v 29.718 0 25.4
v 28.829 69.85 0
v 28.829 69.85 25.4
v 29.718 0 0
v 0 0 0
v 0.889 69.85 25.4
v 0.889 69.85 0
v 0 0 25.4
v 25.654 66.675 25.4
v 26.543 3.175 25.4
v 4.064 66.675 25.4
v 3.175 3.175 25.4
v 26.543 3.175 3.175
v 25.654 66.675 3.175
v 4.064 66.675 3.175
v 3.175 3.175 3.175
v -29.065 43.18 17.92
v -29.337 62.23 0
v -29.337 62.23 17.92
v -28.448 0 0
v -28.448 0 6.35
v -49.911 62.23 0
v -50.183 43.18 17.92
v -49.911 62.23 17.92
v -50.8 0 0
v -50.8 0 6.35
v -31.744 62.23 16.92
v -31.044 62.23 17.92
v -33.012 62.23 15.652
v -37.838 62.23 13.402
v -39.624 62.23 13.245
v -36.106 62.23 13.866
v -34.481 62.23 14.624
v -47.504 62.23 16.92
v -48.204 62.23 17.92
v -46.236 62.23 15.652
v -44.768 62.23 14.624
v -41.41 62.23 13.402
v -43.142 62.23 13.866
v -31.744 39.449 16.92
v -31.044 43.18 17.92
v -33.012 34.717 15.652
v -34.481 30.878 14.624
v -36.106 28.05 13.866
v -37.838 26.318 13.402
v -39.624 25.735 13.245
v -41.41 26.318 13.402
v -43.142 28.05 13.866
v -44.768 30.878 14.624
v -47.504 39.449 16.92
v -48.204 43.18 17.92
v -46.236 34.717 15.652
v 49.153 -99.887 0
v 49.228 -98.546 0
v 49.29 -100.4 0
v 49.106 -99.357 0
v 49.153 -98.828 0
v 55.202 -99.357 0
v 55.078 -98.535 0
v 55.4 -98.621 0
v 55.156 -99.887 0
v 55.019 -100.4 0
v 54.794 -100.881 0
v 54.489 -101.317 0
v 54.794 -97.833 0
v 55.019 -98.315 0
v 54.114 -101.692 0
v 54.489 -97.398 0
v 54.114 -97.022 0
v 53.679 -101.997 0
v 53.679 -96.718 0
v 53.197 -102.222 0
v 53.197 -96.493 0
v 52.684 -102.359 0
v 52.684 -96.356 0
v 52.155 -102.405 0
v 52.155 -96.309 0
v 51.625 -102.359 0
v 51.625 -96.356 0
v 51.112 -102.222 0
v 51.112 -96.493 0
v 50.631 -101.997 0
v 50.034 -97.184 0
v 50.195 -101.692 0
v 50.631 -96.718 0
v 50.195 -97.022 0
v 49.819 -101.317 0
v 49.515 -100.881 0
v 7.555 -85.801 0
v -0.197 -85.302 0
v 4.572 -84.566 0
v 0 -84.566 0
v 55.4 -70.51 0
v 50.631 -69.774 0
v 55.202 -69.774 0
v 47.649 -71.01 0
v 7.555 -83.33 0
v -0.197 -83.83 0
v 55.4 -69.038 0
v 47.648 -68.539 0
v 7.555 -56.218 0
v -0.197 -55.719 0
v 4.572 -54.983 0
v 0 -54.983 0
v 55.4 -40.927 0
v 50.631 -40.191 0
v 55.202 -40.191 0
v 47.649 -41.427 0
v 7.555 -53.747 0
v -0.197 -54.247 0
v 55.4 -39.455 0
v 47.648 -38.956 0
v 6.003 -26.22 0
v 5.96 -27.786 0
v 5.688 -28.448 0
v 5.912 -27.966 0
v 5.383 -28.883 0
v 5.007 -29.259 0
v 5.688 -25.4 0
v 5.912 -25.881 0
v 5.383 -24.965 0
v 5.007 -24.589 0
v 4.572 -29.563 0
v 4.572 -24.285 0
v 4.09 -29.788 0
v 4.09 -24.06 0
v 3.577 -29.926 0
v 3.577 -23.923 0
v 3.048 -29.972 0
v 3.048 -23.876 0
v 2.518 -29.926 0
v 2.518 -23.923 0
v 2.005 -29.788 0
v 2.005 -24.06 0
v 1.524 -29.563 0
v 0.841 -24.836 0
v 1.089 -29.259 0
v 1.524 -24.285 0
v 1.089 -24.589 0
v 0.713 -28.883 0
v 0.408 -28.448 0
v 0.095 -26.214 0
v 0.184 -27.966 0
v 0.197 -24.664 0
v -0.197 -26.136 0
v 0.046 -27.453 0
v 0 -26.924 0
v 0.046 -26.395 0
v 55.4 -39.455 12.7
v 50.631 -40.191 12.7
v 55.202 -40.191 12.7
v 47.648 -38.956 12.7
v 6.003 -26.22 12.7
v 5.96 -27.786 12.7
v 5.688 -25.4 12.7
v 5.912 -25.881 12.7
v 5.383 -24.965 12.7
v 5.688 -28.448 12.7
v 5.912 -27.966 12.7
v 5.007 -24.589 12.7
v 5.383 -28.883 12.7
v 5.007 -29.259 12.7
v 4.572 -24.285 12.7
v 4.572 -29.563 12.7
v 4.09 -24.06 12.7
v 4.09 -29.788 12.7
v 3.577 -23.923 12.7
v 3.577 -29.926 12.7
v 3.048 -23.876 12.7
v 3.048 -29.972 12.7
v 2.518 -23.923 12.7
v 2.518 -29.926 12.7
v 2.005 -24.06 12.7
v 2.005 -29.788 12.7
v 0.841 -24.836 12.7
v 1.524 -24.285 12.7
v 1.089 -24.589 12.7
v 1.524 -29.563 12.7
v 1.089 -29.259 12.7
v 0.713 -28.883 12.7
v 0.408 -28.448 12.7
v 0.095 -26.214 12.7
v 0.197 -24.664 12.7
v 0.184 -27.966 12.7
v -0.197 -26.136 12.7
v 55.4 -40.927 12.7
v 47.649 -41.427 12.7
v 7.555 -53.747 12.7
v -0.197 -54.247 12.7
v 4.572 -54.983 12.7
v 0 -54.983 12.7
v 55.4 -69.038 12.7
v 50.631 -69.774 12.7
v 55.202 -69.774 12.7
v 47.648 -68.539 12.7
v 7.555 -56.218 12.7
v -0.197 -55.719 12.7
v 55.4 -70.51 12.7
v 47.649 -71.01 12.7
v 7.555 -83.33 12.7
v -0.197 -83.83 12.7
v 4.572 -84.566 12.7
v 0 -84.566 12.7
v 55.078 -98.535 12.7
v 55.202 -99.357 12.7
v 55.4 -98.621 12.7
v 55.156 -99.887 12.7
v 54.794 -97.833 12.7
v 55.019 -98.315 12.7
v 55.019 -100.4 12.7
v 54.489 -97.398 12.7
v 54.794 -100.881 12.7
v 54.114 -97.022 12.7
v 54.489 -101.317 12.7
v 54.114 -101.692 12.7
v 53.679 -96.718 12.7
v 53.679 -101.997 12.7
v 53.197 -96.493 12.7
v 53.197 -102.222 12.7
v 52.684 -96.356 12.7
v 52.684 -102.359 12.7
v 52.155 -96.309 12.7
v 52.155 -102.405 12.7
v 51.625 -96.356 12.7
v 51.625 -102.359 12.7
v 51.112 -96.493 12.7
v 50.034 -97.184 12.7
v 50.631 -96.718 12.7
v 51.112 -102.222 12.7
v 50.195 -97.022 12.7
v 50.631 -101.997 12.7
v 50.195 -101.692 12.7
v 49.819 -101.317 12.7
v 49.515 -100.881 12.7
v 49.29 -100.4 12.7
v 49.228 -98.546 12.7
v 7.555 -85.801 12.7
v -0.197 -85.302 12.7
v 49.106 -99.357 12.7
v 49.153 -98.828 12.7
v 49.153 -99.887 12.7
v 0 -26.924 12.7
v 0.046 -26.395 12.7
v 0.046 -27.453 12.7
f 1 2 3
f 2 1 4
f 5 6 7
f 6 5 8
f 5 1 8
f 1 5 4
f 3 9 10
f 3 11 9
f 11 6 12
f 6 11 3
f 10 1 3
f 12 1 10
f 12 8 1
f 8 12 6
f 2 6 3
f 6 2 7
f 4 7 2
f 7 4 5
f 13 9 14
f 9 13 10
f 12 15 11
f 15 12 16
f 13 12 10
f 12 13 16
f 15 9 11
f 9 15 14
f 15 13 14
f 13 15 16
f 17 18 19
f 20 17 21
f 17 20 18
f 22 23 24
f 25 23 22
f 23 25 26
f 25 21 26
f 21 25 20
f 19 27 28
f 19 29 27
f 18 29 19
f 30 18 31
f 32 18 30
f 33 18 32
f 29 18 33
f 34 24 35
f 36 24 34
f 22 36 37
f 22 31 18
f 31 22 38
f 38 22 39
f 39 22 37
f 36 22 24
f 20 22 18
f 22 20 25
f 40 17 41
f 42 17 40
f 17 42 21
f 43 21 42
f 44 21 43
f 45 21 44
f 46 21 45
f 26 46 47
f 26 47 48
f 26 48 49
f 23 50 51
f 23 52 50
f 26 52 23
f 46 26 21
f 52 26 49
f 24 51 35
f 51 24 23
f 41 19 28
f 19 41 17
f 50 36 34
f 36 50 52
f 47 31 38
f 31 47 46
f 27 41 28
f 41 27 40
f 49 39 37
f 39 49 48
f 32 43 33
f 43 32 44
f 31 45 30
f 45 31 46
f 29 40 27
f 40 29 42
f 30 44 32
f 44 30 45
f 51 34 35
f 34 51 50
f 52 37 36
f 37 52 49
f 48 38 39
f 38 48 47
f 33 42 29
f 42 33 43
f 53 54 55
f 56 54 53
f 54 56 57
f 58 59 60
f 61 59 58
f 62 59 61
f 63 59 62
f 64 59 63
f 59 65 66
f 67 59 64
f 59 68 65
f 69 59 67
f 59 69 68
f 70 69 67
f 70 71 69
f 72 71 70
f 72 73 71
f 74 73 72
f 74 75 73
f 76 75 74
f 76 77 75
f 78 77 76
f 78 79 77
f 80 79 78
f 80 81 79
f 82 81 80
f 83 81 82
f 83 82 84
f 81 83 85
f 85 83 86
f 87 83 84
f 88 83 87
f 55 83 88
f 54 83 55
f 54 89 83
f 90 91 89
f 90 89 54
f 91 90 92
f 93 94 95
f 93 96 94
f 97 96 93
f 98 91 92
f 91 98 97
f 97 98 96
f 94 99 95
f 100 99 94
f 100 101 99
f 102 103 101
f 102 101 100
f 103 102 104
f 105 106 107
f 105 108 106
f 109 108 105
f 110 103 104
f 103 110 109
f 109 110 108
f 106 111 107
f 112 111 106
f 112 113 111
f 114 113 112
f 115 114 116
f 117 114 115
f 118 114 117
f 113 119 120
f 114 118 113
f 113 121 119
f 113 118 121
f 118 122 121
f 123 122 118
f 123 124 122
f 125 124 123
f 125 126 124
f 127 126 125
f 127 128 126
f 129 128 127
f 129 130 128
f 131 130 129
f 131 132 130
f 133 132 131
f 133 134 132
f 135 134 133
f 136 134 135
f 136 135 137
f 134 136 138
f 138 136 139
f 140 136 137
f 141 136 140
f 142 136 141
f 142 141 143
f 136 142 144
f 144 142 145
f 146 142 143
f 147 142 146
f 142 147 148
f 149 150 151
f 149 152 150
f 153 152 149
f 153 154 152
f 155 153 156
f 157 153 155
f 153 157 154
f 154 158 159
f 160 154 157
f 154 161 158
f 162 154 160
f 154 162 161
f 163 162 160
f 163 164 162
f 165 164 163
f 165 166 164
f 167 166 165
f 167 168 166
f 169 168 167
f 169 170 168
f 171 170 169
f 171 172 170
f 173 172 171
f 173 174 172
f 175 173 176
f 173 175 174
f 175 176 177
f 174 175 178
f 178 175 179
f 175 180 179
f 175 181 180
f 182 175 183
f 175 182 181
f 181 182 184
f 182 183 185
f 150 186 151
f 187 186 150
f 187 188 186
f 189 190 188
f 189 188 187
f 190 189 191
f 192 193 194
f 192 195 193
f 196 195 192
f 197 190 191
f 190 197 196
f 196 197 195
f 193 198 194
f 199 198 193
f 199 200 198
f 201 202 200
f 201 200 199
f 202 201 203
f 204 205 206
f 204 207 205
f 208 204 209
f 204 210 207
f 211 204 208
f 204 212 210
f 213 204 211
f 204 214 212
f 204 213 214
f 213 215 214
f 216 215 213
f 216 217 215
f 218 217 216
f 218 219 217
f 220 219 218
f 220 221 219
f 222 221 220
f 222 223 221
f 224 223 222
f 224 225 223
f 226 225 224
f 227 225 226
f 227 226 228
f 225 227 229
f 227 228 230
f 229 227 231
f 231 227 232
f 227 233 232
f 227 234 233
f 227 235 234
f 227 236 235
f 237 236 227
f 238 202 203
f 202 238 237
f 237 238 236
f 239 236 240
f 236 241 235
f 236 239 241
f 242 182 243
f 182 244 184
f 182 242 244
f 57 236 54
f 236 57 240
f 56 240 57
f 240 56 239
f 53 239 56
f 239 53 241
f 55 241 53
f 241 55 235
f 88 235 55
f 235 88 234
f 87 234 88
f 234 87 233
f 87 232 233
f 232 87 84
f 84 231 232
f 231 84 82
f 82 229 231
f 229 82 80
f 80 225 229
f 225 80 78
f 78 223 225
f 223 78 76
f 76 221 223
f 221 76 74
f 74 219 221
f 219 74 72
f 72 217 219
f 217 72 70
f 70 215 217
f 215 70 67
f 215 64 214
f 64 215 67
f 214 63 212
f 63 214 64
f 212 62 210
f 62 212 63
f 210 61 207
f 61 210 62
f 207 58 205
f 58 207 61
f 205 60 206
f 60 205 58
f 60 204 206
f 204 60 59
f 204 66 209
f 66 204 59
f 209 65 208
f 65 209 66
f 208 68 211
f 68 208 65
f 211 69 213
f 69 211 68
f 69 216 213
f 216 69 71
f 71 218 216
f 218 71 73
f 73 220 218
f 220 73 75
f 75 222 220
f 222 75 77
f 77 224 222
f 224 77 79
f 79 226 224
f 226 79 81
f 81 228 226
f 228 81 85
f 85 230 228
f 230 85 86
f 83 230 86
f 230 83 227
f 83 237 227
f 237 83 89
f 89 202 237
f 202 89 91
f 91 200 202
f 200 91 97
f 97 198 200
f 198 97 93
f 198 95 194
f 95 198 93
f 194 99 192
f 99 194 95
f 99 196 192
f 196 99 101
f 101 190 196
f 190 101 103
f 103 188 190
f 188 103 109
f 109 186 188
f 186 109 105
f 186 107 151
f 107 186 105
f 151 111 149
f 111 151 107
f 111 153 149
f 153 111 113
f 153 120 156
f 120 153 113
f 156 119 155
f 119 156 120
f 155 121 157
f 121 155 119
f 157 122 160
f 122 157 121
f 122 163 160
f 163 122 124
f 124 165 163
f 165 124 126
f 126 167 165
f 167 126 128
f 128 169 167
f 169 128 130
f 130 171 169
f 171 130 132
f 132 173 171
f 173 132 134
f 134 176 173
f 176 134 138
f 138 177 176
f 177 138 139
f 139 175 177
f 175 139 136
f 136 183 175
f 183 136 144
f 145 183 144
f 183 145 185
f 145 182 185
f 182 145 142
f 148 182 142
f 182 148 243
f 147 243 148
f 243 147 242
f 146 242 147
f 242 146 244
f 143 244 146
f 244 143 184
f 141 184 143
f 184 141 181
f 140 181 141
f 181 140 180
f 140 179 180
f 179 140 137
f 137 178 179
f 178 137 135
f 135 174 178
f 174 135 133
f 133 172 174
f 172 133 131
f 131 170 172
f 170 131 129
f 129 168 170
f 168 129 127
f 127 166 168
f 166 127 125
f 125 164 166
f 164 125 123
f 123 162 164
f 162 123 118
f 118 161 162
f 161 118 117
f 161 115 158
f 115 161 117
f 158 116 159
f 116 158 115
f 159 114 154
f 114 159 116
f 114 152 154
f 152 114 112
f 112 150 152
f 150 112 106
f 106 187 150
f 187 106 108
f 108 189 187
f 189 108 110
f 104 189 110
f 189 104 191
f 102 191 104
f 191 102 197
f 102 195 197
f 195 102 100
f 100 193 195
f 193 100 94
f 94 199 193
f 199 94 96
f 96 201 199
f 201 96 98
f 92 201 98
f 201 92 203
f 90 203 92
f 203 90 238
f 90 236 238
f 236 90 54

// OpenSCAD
// file: ../Components/Semicircle.scad
module semicircle(od=3/4, angle=225, $fn=50) {
  rotate([0,0,-(angle % 90)])
  difference() {
    union() {
      intersection() {

        // Main Body
        circle(r=od/2);

        // 90* Angle cutters
        if (angle < 360)
        for (i=[0: (angle / 90)]) {

          // First angle, angle mod 90
          if (i == 0)
          polygon(points=[[0,0],
                          [od,0],
                          [cos(angle%90) * od, sin(angle%90) * od]]);

          // 90* sections
          if (i>0)
          rotate([0,0,-90*i])
          square([od, od]);
        }
        
      }
    }
  }
}

scale([25.4, 25.4, 25.4])
semicircle();
// main file
module BoxMagazine(majorWidth=0.92, minorWidth=0.85, shellLength=2.5,
                   wallSide=1/8, wallFront=1/8, wallBack=1/8,
                   floorHeight=1/8, height=4) {

  widthDiff = majorWidth - minorWidth;
  halfDiff  = widthDiff/2;

  union() {
    difference() {
      linear_extrude(height=height)
      polygon([
        [0,0],
        [halfDiff,wallBack+shellLength+wallFront],
        [halfDiff+wallSide+minorWidth+wallSide, wallBack+shellLength+wallFront],
        [wallSide+majorWidth+wallSide, 0]
      ]);
      
      translate([0,0,floorHeight])
      linear_extrude(height=height+0.1)
      polygon([
        [wallSide,wallBack],
        [halfDiff+wallSide,wallBack+shellLength],
        [halfDiff+wallSide+minorWidth, wallBack+shellLength],
        [wallSide+majorWidth, wallBack]
      ]);
    }
  }
}



use <../Components/Semicircle.scad>;

module BoxMagazineSpring(springHeight=0.5, segmentLength=2.25, segmentWidth=0.06,
                         segments=5, angle=15, infill=1) {

  opposite = sin(angle) * segmentLength;
  adjacent = cos(angle) * segmentLength;
  spacing = opposite*2;

  linear_extrude(height=springHeight)
  union() {
    
    // Spring
    for(i = [0:segments-1]) {
      
      // Main Section
      translate([ceil(i/2) * spacing,0,0])
      rotate([0,0,(i % 2 == 0 ? -1 : 1) * angle])
      translate([-segmentWidth/2,0])
      square([segmentWidth, segmentLength]);
      
      // Strain Relief
      if (i != 0)
      translate([i * opposite,(i%2 == 0) ? 0 : adjacent,0])
      rotate([0,0,(i%2==0) ? 90 : -90])
      difference() {
        rotate([0,0,angle])
        semicircle(angle=angle*2, od=infill*2);
        
        translate([segmentWidth*3,0])
        rotate([0,0,angle*1.5])
        semicircle(angle=angle*3, od=infill*2);
      };
    }
    
    // Origin Print Adhesion Anchor
    translate([segmentWidth,segmentWidth*2,0])
    circle(r=segmentWidth*2, $fn=36);
    
    // Final Segment Print Adhesion Anchor
    translate([(opposite * segments),adjacent -(segmentWidth*2),0])
    circle(r=segmentWidth*2, $fn=36);
  }
}


module BoxMagazineFollower(majorWidth=0.88, minorWidth=0.81, length=2.45,
                           baseHeight=0.25, angle=15, cutLength=3/4) {
  
  widthDiff = majorWidth - minorWidth;
  halfDiff  = widthDiff/2;
  
  difference() {
    intersection() {
      linear_extrude(height=baseHeight + (tan(angle)*length))
      polygon([
        [0,0],
        [halfDiff,length],
        [halfDiff+minorWidth, length],
        [majorWidth, 0]
      ]);


      rotate([90,0,90])
      linear_extrude(height=majorWidth)
      polygon([
        [0,0],
        [0,baseHeight],
        [length-cutLength,(tan(angle)*(length-cutLength)) + baseHeight],
        [length,(tan(angle)*(length-cutLength)) + baseHeight],
        [length,0]
      ]);
    }
    
    // 
    translate([majorWidth/2,length+0.1,(tan(angle)*length) + minorWidth/3])
    rotate([90,0,0])
    cylinder(r=minorWidth/2, h=length, $fn=36);
  }
}

scale([25.4, 25.4, 25.4]) {
  //translate([-1/8, -1/8,0])
  BoxMagazine(height=1);
  
  translate([0,-1,0])
  rotate([0,0,-90])
  //rotate([0,-90,0])
  BoxMagazineSpring();
  
  //translate([1/8,1/8,0])
  translate([-2,0,0])
  BoxMagazineFollower();
}
